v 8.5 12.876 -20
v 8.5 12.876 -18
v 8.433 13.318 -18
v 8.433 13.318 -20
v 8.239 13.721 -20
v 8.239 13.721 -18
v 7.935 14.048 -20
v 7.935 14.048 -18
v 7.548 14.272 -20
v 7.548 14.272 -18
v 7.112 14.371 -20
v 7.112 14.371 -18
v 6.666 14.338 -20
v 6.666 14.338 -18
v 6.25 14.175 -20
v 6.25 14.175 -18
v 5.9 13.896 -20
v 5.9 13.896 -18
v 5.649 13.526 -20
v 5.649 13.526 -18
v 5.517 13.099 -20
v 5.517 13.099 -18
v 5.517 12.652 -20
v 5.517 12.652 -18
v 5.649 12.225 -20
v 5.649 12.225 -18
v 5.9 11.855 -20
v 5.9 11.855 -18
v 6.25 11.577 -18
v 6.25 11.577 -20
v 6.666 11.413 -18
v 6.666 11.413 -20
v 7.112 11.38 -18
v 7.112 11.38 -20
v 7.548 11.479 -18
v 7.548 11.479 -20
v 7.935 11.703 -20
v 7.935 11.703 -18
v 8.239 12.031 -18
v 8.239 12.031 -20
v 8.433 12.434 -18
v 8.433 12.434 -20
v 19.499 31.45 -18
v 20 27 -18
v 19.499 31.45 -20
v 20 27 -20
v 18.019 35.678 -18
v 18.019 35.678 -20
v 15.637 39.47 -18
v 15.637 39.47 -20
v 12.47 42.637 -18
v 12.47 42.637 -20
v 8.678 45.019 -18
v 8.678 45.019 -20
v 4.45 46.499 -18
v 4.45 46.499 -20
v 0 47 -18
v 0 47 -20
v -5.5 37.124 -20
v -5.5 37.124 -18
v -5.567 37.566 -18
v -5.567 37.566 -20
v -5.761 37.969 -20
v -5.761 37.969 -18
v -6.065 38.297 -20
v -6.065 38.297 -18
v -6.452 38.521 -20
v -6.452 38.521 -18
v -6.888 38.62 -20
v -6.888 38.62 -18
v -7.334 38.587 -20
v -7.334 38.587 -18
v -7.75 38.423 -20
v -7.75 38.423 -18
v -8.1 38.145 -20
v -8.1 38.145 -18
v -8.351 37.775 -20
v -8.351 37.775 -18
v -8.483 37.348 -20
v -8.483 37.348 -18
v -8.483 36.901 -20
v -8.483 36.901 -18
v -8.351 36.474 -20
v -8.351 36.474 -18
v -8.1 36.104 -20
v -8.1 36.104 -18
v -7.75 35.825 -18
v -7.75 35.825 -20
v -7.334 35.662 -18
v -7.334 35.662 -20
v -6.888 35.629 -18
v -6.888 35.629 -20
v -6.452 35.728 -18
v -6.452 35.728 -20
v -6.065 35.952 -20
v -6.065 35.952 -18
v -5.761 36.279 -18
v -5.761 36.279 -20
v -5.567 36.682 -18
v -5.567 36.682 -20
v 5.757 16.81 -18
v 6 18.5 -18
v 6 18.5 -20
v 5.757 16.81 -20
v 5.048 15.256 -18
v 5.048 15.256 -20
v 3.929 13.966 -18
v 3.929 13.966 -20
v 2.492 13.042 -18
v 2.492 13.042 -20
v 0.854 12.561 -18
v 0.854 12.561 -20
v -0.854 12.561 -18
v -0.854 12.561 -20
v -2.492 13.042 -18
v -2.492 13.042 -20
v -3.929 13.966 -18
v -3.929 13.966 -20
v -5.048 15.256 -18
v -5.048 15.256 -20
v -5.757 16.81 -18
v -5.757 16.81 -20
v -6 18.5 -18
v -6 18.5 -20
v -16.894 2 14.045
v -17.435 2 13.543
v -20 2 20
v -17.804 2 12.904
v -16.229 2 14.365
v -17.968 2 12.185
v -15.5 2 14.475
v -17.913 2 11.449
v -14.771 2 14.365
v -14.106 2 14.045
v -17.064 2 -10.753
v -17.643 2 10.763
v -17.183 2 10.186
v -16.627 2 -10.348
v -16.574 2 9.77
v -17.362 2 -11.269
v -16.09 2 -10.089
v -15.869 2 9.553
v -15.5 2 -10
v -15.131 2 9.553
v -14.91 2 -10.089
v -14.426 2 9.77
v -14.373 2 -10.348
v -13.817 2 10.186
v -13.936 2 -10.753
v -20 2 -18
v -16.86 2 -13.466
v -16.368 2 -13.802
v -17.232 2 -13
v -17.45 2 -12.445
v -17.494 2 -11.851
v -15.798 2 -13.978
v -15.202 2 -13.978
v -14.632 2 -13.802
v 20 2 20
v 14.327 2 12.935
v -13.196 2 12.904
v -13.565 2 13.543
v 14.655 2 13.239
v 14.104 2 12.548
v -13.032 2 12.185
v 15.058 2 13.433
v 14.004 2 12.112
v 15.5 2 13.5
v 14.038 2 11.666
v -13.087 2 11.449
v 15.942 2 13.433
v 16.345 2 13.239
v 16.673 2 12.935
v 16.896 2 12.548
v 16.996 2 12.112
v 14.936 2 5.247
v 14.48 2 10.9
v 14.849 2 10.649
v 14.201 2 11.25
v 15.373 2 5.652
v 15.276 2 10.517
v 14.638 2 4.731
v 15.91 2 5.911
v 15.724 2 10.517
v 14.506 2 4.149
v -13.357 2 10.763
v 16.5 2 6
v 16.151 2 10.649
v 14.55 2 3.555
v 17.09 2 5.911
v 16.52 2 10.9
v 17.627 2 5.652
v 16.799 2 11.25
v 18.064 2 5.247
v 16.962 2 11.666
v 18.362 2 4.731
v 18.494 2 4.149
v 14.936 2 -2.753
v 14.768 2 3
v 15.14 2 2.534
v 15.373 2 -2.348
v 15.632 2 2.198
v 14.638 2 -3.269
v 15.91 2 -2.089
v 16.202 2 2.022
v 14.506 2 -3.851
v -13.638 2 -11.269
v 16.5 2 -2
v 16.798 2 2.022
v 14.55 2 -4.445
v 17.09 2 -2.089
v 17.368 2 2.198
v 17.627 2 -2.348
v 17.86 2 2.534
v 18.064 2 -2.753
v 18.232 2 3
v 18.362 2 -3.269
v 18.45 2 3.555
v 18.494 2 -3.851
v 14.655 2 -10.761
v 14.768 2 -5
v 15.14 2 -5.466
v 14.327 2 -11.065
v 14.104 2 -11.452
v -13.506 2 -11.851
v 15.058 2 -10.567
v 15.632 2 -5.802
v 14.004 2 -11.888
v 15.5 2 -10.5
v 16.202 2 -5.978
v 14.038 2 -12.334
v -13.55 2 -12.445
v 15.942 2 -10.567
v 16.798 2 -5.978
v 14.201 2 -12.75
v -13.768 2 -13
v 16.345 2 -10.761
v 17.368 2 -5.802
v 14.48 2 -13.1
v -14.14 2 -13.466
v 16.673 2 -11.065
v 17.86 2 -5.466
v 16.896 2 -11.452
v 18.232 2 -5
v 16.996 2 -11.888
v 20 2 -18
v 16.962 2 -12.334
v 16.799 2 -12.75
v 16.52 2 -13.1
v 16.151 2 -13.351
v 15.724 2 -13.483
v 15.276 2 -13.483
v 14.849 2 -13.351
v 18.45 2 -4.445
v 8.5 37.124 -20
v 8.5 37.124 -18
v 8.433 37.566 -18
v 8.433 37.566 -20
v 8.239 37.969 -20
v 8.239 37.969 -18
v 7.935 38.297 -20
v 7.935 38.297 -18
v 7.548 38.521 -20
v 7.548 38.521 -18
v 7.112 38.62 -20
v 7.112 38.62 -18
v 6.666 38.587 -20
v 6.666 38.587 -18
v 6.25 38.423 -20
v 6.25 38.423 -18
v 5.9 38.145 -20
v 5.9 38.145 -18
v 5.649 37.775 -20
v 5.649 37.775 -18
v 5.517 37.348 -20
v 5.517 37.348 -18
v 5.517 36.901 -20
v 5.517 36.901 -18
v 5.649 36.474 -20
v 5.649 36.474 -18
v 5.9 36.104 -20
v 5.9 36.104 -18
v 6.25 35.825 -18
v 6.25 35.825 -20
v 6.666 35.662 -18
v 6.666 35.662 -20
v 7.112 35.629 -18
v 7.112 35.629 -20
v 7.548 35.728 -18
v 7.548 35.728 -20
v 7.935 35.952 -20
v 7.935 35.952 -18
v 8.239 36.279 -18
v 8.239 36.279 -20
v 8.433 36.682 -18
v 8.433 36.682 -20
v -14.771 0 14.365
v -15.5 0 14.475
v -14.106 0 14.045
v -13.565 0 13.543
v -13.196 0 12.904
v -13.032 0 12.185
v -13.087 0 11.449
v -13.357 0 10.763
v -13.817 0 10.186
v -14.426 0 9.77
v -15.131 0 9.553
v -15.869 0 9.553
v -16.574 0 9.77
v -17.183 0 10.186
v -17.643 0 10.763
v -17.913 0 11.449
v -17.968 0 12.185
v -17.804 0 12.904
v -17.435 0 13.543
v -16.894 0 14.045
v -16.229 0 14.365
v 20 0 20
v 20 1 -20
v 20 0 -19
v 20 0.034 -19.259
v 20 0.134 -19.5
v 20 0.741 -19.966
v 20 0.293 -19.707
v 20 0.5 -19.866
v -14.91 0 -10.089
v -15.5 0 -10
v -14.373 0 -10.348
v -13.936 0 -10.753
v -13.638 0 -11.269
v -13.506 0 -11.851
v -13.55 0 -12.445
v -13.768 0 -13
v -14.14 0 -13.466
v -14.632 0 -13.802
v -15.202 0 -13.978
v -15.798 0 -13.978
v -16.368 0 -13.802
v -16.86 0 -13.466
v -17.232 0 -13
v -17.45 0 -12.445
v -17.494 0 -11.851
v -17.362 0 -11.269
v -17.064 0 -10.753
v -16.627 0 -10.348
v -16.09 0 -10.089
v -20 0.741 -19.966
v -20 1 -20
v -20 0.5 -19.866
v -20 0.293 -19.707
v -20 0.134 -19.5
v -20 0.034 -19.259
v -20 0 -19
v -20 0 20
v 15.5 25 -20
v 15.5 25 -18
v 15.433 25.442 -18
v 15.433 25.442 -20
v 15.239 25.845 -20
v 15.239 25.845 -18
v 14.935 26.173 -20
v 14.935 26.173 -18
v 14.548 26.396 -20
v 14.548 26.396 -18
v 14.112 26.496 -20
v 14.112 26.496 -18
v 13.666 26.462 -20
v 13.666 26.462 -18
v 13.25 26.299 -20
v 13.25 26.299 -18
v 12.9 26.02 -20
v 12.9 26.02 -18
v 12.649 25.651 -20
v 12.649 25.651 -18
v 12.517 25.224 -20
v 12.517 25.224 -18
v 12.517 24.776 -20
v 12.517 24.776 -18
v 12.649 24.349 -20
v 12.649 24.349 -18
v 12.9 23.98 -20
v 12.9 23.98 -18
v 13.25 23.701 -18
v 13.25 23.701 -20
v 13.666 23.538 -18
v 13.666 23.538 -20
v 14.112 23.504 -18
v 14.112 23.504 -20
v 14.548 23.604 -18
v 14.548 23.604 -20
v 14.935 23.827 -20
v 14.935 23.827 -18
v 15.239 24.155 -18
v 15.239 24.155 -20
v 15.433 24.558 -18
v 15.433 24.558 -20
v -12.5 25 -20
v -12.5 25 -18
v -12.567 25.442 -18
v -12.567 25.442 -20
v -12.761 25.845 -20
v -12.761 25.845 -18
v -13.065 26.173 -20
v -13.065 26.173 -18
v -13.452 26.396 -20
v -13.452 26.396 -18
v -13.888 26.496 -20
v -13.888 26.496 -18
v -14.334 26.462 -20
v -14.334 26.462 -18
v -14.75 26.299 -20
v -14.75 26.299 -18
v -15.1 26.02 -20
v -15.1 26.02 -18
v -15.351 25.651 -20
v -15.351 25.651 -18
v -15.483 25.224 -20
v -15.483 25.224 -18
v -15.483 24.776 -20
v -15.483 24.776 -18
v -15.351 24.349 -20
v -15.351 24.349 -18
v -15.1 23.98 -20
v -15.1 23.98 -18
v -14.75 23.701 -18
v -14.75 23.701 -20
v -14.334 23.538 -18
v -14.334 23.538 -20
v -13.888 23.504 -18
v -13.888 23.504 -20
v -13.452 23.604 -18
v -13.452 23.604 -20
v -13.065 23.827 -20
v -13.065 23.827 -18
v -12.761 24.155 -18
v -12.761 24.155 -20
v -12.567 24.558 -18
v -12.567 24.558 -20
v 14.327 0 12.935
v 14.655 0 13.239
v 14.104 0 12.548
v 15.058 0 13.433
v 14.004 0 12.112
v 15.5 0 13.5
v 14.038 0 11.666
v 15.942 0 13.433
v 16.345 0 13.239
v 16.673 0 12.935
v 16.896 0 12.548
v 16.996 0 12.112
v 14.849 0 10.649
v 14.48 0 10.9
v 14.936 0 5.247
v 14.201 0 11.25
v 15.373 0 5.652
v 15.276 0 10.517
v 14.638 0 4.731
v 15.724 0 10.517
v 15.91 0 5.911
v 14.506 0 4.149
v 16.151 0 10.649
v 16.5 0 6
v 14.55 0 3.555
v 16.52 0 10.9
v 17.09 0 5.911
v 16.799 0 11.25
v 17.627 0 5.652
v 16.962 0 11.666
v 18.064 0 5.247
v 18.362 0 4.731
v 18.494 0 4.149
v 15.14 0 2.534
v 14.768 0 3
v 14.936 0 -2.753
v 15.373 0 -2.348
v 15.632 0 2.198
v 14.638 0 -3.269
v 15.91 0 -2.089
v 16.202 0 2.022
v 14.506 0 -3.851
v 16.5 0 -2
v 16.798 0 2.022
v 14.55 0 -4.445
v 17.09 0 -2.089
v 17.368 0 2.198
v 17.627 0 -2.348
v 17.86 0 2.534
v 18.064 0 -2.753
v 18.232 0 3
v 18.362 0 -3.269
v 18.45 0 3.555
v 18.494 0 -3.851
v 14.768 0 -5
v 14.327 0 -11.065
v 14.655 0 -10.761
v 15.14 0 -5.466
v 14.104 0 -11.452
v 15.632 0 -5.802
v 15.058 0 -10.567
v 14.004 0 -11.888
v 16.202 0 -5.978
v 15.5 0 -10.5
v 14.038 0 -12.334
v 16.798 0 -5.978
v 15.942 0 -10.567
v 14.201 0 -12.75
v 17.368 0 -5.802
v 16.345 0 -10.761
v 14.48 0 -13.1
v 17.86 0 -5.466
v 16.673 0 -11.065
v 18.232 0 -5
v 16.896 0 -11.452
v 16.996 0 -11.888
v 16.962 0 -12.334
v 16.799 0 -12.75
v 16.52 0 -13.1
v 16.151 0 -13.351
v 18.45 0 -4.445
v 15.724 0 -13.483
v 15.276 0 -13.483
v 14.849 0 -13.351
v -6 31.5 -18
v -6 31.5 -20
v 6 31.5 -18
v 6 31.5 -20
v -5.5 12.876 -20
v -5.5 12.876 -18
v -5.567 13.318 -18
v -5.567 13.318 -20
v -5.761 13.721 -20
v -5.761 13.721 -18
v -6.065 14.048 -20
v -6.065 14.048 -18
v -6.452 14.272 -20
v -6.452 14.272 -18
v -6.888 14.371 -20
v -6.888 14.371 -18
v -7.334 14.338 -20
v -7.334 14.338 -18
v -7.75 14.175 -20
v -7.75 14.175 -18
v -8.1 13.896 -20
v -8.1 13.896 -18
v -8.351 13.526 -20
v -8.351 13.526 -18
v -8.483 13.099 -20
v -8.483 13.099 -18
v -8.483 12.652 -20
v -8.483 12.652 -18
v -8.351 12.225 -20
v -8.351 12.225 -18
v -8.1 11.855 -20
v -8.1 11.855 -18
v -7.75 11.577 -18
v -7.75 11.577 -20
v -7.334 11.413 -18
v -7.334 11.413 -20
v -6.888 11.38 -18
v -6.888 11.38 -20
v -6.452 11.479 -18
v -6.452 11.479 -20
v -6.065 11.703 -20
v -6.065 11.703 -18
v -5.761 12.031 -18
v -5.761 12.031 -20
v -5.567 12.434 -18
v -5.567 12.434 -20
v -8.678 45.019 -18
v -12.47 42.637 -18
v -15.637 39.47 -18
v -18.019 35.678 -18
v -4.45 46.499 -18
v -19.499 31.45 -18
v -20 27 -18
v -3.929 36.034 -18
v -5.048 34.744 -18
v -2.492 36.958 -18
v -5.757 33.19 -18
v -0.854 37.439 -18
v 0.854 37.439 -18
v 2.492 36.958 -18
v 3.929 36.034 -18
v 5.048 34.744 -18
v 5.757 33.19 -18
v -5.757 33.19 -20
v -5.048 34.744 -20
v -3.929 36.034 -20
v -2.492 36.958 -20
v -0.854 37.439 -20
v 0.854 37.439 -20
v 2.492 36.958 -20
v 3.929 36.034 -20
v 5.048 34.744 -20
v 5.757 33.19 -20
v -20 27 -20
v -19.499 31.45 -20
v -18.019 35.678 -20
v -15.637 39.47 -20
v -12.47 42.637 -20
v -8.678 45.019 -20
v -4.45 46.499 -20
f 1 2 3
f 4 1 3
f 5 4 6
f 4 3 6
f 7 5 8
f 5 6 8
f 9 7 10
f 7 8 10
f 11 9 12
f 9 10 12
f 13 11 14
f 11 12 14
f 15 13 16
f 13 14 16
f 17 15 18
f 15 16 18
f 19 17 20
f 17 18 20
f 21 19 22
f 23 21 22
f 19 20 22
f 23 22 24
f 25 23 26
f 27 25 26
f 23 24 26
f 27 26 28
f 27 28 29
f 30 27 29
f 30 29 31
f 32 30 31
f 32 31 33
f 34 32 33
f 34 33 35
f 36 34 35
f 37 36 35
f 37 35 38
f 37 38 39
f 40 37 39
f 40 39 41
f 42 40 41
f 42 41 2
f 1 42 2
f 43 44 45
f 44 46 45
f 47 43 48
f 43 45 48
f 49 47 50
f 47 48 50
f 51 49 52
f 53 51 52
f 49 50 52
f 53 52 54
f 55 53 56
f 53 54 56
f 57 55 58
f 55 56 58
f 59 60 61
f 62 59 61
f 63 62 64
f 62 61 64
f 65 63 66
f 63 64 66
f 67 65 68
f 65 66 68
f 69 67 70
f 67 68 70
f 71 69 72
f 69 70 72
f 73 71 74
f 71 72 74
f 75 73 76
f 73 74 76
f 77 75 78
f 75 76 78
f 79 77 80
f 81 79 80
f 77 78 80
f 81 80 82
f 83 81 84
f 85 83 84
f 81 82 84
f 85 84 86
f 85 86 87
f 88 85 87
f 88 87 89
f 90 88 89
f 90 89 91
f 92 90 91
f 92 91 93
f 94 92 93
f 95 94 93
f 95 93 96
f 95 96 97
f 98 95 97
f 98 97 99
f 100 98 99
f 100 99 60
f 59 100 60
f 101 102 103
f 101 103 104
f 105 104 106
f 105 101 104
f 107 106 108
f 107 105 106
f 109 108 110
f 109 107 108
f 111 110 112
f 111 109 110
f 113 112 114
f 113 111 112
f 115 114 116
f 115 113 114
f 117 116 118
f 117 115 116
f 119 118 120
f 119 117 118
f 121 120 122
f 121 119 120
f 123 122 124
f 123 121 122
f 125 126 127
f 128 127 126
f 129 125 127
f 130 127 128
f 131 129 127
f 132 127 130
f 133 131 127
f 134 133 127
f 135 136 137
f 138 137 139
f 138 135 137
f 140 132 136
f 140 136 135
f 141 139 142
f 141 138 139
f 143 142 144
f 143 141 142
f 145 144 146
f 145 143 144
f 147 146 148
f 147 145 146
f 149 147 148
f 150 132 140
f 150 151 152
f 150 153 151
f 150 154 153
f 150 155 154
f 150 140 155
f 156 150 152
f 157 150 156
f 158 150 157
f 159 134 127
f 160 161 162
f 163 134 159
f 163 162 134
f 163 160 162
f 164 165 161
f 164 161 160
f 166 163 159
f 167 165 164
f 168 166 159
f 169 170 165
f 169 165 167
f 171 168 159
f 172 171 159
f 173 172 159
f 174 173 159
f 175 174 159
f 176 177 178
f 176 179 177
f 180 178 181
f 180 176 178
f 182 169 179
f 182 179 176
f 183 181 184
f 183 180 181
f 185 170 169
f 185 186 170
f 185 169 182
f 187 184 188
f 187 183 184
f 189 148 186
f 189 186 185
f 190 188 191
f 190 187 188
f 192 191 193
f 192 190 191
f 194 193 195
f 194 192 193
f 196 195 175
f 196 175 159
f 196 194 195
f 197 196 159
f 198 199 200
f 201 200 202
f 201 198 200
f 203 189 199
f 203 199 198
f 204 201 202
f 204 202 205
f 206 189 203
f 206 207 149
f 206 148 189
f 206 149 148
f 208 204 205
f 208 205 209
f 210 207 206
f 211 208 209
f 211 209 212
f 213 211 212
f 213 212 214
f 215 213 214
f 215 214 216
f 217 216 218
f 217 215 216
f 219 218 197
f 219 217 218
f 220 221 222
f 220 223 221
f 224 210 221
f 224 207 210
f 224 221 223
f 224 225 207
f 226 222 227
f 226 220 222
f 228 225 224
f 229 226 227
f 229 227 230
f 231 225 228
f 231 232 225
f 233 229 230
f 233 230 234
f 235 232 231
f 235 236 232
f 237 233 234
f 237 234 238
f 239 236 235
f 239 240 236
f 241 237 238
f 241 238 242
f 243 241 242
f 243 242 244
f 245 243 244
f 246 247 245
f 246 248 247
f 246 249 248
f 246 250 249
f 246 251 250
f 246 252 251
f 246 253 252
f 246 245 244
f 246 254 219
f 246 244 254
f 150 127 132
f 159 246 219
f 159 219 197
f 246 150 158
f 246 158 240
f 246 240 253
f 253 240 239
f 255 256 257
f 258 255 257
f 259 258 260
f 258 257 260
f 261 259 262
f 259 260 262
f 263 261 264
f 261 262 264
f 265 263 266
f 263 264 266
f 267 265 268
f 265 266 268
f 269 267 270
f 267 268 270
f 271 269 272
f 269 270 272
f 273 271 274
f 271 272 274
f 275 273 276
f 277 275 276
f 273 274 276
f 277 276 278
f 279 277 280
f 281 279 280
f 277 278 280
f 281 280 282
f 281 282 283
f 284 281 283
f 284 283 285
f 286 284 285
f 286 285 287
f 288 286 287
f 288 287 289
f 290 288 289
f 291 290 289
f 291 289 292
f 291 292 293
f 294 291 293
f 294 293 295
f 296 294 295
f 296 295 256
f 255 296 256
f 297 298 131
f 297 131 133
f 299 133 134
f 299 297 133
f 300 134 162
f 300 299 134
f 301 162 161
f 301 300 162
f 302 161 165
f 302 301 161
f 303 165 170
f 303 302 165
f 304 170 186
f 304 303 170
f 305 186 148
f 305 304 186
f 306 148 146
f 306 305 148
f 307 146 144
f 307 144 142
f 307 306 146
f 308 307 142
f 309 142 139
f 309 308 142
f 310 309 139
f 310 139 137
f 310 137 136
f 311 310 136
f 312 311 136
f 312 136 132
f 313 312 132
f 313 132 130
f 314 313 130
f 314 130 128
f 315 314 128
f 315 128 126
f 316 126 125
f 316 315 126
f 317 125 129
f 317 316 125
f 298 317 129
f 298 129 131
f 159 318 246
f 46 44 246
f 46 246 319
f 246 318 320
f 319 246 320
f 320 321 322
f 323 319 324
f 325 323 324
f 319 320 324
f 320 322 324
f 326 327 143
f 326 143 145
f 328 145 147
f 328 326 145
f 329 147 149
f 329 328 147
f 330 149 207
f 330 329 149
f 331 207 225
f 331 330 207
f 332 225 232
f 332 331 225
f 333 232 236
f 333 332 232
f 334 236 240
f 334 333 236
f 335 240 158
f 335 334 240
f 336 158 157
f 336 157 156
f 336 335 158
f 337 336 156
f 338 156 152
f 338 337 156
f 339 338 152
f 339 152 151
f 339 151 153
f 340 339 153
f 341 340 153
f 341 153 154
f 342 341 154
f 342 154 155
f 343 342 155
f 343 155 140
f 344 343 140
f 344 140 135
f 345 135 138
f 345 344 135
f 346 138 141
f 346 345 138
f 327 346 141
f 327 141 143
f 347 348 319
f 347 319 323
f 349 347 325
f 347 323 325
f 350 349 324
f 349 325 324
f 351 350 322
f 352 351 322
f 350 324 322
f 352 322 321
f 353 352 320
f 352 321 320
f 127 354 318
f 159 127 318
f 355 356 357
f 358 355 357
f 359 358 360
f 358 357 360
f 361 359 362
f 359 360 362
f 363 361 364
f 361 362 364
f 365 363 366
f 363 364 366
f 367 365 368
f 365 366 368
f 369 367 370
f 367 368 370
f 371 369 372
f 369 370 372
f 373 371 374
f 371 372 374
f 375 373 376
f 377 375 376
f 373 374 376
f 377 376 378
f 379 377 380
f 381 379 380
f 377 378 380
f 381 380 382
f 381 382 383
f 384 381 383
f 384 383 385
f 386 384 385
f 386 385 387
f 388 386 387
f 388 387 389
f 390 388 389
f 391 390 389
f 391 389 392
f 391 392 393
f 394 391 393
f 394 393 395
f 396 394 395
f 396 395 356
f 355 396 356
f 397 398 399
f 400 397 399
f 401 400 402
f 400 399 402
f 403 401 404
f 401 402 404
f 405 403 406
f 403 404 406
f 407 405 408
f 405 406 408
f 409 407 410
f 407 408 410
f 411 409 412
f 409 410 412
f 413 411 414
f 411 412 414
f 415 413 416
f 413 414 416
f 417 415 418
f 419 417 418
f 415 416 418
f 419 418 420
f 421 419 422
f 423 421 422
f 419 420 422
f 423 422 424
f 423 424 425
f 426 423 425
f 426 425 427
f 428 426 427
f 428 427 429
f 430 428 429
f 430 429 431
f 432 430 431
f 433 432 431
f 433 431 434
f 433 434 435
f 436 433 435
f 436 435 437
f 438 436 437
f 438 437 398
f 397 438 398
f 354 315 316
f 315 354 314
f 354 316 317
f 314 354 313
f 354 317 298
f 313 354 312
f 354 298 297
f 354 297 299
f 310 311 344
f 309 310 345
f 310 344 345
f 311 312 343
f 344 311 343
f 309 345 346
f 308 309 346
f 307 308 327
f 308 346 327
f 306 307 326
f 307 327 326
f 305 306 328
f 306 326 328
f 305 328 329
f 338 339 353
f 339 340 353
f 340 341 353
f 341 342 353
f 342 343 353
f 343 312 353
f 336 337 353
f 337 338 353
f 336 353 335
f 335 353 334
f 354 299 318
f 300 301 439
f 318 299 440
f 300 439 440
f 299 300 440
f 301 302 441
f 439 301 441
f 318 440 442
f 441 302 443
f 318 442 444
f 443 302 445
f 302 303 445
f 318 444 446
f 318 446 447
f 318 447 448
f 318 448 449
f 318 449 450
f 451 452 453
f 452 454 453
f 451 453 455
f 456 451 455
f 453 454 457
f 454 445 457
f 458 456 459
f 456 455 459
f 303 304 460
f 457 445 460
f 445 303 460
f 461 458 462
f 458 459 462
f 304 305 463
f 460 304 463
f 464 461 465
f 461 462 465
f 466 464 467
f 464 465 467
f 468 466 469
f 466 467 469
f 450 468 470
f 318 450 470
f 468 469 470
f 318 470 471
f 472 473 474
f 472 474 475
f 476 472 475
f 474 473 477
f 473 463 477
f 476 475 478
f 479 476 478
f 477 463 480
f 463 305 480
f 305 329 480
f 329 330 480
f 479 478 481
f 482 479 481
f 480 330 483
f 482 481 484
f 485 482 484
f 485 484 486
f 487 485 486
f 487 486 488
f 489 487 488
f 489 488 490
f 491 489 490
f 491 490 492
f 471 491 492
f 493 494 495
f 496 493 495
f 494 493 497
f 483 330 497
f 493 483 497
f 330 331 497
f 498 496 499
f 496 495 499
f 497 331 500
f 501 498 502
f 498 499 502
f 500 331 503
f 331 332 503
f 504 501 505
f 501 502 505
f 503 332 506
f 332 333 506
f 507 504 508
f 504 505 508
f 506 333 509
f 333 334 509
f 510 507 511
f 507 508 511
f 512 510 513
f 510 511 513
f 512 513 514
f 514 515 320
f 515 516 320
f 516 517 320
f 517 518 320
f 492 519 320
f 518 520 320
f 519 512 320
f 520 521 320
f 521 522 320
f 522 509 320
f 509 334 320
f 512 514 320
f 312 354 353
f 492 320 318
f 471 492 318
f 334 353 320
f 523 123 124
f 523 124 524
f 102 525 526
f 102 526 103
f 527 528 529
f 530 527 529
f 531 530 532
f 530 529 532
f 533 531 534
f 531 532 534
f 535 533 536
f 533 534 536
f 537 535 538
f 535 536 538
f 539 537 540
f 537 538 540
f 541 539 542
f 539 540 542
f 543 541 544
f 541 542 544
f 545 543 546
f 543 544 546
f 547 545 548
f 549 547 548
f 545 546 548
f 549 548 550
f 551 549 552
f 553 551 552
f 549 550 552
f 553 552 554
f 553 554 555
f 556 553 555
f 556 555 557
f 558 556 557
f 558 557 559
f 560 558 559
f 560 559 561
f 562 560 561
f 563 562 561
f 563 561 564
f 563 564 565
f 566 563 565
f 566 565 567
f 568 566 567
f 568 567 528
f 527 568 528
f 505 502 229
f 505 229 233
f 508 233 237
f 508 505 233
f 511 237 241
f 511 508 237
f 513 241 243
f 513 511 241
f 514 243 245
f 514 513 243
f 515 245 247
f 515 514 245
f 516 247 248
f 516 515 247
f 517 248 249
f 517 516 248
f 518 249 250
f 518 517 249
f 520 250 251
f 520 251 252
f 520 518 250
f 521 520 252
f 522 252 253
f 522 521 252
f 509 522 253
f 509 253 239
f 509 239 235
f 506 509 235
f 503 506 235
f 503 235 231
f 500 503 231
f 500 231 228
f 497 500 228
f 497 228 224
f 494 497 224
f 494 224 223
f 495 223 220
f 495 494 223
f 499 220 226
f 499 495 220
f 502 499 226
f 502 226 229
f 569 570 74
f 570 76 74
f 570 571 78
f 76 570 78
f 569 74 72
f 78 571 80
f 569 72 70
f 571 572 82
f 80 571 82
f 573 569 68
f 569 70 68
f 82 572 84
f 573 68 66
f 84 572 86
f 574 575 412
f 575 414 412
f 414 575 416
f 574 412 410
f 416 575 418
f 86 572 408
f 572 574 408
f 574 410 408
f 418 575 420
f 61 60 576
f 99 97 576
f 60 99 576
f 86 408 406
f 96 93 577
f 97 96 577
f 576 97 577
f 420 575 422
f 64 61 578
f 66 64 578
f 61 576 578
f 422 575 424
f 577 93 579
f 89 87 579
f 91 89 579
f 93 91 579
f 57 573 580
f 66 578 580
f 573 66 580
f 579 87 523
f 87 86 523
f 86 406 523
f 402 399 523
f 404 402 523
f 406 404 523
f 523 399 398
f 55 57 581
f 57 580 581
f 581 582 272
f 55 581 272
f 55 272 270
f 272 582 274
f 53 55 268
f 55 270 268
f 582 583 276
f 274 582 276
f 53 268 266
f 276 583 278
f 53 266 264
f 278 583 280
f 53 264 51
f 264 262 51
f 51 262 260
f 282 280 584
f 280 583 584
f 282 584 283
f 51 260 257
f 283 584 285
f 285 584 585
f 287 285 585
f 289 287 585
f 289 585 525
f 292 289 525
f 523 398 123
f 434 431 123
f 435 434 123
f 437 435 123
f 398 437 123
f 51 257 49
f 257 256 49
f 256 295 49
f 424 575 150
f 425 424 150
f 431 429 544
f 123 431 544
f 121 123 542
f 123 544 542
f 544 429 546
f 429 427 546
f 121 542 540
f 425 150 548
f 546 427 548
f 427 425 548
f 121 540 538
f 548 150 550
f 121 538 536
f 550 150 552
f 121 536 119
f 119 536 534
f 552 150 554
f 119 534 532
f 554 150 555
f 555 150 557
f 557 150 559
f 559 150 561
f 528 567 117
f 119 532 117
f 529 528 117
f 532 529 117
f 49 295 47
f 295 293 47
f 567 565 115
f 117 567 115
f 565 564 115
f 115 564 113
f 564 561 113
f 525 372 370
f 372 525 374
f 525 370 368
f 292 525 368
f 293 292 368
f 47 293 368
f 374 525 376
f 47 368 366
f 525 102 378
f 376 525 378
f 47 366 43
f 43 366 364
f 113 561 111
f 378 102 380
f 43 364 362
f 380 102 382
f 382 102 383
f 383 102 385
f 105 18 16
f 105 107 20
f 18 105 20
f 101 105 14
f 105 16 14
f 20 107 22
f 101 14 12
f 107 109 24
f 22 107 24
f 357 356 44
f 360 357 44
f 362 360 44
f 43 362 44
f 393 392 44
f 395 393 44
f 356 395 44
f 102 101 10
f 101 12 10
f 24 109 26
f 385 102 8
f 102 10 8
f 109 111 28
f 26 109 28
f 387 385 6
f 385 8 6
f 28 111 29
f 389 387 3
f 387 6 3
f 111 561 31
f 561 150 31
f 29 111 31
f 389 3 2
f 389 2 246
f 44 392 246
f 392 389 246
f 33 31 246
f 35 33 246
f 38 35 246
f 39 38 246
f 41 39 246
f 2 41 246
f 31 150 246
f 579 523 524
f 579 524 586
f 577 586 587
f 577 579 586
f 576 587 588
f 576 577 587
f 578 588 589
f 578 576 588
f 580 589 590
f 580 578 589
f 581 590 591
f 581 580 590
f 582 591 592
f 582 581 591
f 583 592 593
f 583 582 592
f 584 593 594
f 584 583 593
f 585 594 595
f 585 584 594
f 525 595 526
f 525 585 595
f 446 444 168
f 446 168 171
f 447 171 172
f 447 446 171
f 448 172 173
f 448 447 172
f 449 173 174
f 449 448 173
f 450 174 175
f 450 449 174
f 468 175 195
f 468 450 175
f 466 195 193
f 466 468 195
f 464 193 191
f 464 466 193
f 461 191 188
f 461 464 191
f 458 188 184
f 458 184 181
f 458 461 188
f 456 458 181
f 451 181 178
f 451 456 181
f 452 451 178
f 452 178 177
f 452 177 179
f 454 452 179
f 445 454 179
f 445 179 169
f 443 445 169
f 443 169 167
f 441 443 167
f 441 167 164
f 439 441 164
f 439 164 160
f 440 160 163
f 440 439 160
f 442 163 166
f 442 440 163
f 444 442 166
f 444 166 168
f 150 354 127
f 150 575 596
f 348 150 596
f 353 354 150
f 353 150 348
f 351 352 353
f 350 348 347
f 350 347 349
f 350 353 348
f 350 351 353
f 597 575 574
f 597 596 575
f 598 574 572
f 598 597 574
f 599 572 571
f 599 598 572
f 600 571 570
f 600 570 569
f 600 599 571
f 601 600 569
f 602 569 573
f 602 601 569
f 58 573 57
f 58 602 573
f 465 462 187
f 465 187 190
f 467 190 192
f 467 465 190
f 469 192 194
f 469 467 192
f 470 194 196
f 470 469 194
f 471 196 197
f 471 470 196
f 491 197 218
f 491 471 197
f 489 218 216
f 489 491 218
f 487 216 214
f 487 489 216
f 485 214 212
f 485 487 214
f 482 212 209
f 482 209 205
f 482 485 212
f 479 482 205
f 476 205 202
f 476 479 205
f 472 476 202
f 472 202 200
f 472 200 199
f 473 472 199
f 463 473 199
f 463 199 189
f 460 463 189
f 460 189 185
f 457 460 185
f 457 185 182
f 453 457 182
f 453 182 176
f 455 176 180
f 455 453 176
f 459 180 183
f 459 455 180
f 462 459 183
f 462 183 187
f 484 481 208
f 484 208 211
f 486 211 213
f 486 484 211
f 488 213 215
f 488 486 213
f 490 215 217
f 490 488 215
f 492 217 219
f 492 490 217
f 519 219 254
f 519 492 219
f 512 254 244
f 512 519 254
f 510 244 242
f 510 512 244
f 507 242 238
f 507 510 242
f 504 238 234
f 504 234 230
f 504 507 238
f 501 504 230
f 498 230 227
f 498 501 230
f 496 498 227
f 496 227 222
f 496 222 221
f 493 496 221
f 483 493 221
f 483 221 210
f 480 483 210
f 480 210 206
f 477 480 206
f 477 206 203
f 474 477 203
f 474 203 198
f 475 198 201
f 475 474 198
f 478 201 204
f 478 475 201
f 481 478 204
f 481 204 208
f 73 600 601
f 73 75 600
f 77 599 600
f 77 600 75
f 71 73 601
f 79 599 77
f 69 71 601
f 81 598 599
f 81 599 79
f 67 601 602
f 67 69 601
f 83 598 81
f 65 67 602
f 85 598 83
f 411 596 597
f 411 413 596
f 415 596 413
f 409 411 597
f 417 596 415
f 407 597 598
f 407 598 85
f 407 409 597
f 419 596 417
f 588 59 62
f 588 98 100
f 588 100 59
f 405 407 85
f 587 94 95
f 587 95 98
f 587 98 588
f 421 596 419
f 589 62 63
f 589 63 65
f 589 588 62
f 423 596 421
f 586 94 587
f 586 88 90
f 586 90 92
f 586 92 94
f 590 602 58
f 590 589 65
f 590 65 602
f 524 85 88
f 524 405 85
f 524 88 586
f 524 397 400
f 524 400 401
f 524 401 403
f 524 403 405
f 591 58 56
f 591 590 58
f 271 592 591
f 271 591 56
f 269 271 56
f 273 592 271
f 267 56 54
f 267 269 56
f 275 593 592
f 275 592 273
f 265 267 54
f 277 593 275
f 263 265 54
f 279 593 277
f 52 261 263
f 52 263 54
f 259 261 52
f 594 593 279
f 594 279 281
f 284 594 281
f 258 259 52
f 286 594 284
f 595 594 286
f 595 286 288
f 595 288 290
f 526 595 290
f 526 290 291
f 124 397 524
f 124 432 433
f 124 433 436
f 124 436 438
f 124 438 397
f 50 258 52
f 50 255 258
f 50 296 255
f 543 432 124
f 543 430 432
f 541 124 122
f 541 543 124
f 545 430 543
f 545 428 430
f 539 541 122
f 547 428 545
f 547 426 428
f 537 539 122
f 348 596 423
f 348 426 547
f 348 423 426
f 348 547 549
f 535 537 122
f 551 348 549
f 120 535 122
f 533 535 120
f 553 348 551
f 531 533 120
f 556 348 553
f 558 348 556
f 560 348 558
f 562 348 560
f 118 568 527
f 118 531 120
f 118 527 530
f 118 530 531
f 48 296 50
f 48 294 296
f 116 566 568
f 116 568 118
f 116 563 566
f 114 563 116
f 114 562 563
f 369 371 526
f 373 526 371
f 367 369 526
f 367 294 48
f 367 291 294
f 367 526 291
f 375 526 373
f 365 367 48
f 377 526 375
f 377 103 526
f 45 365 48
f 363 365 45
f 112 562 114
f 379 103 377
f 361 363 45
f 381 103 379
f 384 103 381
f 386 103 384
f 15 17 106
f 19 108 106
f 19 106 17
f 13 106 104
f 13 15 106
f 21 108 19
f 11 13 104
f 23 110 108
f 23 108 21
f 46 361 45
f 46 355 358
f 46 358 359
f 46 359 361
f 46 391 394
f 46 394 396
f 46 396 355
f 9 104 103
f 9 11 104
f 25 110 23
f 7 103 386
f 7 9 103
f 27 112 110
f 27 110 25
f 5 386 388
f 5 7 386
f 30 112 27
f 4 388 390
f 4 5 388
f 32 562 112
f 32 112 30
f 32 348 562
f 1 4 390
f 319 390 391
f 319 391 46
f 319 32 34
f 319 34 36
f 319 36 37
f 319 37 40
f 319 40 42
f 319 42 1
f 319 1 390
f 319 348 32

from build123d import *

# Parameters (mm, degrees)
SKETCH1_W           = 40
SKETCH1_H           = 38
SKETCH1_R           = 2.474873734
SKETCH1_R_2         = 1.5
SKETCH1_R_3         = 2
BOSS_EXTRUDE3_DEPTH = 2
SKETCH1_5_W         = 40
SKETCH1_5_H         = 2
BOSS_EXTRUDE4_DEPTH = 47
FILLET1_R           = 20
FILLET2_R           = 1
SKETCH2_R           = 1.5
CUT_EXTRUDE2_DEPTH  = 47


with BuildPart() as part:
    # Sketch1 → Boss-Extrude3 (new body)
    with BuildSketch(Plane(origin=(0, 0, 0), x_dir=(1, 0, 0), z_dir=(0, 1, 0))):
        with Locations((0, -1)):
            Rectangle(SKETCH1_W, SKETCH1_H)
        with Locations(Location((-15.5, -12, 0), (0, 0, 270))):
            Circle(SKETCH1_R, mode=Mode.SUBTRACT)
        with Locations(Location((15.5, -12, 0), (0, 0, 270))):
            Circle(SKETCH1_R_2, mode=Mode.SUBTRACT)
        with Locations(Location((16.5, -4, 0), (0, 0, 270))):
            Circle(SKETCH1_R_3, mode=Mode.SUBTRACT)
        with Locations(Location((-15.5, 12, 0), (0, 0, 270))):
            Circle(SKETCH1_R_3, mode=Mode.SUBTRACT)
        with Locations(Location((16.5, 4, 0), (0, 0, 270))):
            Circle(SKETCH1_R_3, mode=Mode.SUBTRACT)
        with Locations(Location((15.5, 12, 0), (0, 0, 270))):
            Circle(SKETCH1_R_2, mode=Mode.SUBTRACT)
    extrude(amount=BOSS_EXTRUDE3_DEPTH)

    # Sketch1<5> → Boss-Extrude4 (add)
    with BuildSketch(Plane(origin=(0, 0, 0), x_dir=(1, 0, 0), z_dir=(0, 1, 0))):
        with Locations((0, 19)):
            Rectangle(SKETCH1_5_W, SKETCH1_5_H)
    extrude(amount=BOSS_EXTRUDE4_DEPTH)

    # Fillet1
    fillet1_edges = [part.edges().sort_by_distance(p)[0] for p in [
        (20, 47, -19),
        (-20, 47, -19),
    ]]
    fillet(fillet1_edges, radius=FILLET1_R - 0.0001)  # a hair under: the kernel refuses the full size

    # Fillet2
    fillet2_edges = [part.edges().sort_by_distance(p)[0] for p in [
        (0, 0, -20),
    ]]
    fillet(fillet2_edges, radius=FILLET2_R)

    # Sketch2 → Cut-Extrude2 (cut)
    with BuildSketch(Plane.XY.offset(-18)):
        with Locations((-14, 25)):
            Circle(SKETCH2_R)
        with Locations((-7, 37.124355653)):
            Circle(SKETCH2_R)
        with Locations((7, 37.124355653)):
            Circle(SKETCH2_R)
        with Locations((14, 25)):
            Circle(SKETCH2_R)
        with Locations((7, 12.875644347)):
            Circle(SKETCH2_R)
        with Locations((-7, 12.875644347)):
            Circle(SKETCH2_R)
        with BuildLine():
            Line((6, 31.5), (6, 18.5))
            ThreePointArc((6, 18.5), (0, 12.5), (-6, 18.5))
            Line((-6, 18.5), (-6, 31.5))
            ThreePointArc((-6, 31.5), (0, 37.5), (6, 31.5))
        make_face()
    extrude(amount=-CUT_EXTRUDE2_DEPTH, mode=Mode.SUBTRACT)


solid = part.part
